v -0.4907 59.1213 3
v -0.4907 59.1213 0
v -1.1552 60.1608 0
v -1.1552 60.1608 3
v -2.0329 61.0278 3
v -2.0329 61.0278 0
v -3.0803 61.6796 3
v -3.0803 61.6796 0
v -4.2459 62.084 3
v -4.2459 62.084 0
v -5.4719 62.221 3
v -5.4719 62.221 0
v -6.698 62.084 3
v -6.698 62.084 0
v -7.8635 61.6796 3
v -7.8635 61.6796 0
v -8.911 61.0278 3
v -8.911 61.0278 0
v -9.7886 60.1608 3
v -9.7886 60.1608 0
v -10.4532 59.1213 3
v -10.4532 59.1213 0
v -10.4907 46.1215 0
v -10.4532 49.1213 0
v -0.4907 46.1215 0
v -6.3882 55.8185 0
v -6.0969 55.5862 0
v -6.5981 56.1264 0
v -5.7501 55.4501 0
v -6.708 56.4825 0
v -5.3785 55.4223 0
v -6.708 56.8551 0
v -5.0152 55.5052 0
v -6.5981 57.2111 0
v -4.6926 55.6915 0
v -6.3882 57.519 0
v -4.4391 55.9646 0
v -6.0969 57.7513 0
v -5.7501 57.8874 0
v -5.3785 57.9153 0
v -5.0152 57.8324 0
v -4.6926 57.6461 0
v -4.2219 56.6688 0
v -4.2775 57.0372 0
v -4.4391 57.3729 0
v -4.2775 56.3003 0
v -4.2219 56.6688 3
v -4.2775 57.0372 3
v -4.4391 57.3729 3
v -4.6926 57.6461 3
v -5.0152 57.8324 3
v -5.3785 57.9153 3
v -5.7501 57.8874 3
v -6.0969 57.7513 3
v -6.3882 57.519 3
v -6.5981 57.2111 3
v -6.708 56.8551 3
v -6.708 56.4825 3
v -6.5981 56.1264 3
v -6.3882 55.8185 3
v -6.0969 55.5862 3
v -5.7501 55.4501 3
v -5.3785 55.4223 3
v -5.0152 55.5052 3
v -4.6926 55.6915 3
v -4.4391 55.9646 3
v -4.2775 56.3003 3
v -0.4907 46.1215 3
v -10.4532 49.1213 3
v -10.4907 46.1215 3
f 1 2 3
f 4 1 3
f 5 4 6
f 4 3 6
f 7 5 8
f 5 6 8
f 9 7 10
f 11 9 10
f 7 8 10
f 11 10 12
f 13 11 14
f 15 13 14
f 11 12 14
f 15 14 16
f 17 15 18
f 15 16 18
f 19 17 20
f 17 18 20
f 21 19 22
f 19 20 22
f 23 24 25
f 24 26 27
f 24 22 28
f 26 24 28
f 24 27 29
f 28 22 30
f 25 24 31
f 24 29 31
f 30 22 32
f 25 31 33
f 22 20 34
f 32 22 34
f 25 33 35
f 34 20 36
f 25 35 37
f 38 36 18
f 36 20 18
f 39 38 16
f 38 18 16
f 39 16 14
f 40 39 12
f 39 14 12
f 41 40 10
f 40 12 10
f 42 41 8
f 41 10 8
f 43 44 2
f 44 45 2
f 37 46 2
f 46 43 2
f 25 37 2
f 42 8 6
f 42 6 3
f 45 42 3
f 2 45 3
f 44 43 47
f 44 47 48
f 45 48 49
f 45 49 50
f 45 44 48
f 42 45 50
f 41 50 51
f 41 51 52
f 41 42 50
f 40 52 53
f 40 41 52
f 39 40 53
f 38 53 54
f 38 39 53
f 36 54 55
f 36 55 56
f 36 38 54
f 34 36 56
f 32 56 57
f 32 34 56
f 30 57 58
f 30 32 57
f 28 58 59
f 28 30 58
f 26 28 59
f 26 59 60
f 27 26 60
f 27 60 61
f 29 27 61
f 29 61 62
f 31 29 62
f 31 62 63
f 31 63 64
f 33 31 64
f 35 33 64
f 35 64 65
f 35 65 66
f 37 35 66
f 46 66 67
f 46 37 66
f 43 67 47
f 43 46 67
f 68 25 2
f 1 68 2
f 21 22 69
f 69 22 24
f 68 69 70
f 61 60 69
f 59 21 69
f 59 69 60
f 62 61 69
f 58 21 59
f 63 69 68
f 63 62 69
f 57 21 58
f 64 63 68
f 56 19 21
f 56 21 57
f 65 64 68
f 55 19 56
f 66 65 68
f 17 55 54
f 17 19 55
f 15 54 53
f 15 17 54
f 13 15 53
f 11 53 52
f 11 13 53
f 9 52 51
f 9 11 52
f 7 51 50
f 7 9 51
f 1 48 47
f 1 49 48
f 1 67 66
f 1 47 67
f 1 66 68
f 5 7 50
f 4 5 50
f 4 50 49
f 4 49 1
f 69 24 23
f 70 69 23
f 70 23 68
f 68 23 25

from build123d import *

# Parameters (mm, degrees)
SKETCH1_R           = 1.25
BOSS_EXTRUDE1_DEPTH = 3


with BuildPart() as part:
    # Sketch1 → Boss-Extrude1 (new body)
    with BuildSketch(Plane.XY):
        with BuildLine():
            Line((-10.453152026, 49.121338482), (-10.49069983, 46.121502107))
            Line((-10.49069983, 46.121502107), (-0.49069983, 46.121502107))
            Line((-0.49069983, 46.121502107), (-0.49069983, 49.121502107))
            Line((-0.49069983, 49.121502107), (-0.49069983, 59.121338482))
            ThreePointArc((-0.49069983, 59.121338482), (-5.471925928, 62.221036999), (-10.453152026, 59.121338482))
            Line((-10.453152026, 59.121338482), (-10.453152026, 49.121338482))
        make_face()
        with Locations((-5.471925928, 56.668764069)):
            Circle(SKETCH1_R, mode=Mode.SUBTRACT)
    extrude(amount=BOSS_EXTRUDE1_DEPTH)


solid = part.part
